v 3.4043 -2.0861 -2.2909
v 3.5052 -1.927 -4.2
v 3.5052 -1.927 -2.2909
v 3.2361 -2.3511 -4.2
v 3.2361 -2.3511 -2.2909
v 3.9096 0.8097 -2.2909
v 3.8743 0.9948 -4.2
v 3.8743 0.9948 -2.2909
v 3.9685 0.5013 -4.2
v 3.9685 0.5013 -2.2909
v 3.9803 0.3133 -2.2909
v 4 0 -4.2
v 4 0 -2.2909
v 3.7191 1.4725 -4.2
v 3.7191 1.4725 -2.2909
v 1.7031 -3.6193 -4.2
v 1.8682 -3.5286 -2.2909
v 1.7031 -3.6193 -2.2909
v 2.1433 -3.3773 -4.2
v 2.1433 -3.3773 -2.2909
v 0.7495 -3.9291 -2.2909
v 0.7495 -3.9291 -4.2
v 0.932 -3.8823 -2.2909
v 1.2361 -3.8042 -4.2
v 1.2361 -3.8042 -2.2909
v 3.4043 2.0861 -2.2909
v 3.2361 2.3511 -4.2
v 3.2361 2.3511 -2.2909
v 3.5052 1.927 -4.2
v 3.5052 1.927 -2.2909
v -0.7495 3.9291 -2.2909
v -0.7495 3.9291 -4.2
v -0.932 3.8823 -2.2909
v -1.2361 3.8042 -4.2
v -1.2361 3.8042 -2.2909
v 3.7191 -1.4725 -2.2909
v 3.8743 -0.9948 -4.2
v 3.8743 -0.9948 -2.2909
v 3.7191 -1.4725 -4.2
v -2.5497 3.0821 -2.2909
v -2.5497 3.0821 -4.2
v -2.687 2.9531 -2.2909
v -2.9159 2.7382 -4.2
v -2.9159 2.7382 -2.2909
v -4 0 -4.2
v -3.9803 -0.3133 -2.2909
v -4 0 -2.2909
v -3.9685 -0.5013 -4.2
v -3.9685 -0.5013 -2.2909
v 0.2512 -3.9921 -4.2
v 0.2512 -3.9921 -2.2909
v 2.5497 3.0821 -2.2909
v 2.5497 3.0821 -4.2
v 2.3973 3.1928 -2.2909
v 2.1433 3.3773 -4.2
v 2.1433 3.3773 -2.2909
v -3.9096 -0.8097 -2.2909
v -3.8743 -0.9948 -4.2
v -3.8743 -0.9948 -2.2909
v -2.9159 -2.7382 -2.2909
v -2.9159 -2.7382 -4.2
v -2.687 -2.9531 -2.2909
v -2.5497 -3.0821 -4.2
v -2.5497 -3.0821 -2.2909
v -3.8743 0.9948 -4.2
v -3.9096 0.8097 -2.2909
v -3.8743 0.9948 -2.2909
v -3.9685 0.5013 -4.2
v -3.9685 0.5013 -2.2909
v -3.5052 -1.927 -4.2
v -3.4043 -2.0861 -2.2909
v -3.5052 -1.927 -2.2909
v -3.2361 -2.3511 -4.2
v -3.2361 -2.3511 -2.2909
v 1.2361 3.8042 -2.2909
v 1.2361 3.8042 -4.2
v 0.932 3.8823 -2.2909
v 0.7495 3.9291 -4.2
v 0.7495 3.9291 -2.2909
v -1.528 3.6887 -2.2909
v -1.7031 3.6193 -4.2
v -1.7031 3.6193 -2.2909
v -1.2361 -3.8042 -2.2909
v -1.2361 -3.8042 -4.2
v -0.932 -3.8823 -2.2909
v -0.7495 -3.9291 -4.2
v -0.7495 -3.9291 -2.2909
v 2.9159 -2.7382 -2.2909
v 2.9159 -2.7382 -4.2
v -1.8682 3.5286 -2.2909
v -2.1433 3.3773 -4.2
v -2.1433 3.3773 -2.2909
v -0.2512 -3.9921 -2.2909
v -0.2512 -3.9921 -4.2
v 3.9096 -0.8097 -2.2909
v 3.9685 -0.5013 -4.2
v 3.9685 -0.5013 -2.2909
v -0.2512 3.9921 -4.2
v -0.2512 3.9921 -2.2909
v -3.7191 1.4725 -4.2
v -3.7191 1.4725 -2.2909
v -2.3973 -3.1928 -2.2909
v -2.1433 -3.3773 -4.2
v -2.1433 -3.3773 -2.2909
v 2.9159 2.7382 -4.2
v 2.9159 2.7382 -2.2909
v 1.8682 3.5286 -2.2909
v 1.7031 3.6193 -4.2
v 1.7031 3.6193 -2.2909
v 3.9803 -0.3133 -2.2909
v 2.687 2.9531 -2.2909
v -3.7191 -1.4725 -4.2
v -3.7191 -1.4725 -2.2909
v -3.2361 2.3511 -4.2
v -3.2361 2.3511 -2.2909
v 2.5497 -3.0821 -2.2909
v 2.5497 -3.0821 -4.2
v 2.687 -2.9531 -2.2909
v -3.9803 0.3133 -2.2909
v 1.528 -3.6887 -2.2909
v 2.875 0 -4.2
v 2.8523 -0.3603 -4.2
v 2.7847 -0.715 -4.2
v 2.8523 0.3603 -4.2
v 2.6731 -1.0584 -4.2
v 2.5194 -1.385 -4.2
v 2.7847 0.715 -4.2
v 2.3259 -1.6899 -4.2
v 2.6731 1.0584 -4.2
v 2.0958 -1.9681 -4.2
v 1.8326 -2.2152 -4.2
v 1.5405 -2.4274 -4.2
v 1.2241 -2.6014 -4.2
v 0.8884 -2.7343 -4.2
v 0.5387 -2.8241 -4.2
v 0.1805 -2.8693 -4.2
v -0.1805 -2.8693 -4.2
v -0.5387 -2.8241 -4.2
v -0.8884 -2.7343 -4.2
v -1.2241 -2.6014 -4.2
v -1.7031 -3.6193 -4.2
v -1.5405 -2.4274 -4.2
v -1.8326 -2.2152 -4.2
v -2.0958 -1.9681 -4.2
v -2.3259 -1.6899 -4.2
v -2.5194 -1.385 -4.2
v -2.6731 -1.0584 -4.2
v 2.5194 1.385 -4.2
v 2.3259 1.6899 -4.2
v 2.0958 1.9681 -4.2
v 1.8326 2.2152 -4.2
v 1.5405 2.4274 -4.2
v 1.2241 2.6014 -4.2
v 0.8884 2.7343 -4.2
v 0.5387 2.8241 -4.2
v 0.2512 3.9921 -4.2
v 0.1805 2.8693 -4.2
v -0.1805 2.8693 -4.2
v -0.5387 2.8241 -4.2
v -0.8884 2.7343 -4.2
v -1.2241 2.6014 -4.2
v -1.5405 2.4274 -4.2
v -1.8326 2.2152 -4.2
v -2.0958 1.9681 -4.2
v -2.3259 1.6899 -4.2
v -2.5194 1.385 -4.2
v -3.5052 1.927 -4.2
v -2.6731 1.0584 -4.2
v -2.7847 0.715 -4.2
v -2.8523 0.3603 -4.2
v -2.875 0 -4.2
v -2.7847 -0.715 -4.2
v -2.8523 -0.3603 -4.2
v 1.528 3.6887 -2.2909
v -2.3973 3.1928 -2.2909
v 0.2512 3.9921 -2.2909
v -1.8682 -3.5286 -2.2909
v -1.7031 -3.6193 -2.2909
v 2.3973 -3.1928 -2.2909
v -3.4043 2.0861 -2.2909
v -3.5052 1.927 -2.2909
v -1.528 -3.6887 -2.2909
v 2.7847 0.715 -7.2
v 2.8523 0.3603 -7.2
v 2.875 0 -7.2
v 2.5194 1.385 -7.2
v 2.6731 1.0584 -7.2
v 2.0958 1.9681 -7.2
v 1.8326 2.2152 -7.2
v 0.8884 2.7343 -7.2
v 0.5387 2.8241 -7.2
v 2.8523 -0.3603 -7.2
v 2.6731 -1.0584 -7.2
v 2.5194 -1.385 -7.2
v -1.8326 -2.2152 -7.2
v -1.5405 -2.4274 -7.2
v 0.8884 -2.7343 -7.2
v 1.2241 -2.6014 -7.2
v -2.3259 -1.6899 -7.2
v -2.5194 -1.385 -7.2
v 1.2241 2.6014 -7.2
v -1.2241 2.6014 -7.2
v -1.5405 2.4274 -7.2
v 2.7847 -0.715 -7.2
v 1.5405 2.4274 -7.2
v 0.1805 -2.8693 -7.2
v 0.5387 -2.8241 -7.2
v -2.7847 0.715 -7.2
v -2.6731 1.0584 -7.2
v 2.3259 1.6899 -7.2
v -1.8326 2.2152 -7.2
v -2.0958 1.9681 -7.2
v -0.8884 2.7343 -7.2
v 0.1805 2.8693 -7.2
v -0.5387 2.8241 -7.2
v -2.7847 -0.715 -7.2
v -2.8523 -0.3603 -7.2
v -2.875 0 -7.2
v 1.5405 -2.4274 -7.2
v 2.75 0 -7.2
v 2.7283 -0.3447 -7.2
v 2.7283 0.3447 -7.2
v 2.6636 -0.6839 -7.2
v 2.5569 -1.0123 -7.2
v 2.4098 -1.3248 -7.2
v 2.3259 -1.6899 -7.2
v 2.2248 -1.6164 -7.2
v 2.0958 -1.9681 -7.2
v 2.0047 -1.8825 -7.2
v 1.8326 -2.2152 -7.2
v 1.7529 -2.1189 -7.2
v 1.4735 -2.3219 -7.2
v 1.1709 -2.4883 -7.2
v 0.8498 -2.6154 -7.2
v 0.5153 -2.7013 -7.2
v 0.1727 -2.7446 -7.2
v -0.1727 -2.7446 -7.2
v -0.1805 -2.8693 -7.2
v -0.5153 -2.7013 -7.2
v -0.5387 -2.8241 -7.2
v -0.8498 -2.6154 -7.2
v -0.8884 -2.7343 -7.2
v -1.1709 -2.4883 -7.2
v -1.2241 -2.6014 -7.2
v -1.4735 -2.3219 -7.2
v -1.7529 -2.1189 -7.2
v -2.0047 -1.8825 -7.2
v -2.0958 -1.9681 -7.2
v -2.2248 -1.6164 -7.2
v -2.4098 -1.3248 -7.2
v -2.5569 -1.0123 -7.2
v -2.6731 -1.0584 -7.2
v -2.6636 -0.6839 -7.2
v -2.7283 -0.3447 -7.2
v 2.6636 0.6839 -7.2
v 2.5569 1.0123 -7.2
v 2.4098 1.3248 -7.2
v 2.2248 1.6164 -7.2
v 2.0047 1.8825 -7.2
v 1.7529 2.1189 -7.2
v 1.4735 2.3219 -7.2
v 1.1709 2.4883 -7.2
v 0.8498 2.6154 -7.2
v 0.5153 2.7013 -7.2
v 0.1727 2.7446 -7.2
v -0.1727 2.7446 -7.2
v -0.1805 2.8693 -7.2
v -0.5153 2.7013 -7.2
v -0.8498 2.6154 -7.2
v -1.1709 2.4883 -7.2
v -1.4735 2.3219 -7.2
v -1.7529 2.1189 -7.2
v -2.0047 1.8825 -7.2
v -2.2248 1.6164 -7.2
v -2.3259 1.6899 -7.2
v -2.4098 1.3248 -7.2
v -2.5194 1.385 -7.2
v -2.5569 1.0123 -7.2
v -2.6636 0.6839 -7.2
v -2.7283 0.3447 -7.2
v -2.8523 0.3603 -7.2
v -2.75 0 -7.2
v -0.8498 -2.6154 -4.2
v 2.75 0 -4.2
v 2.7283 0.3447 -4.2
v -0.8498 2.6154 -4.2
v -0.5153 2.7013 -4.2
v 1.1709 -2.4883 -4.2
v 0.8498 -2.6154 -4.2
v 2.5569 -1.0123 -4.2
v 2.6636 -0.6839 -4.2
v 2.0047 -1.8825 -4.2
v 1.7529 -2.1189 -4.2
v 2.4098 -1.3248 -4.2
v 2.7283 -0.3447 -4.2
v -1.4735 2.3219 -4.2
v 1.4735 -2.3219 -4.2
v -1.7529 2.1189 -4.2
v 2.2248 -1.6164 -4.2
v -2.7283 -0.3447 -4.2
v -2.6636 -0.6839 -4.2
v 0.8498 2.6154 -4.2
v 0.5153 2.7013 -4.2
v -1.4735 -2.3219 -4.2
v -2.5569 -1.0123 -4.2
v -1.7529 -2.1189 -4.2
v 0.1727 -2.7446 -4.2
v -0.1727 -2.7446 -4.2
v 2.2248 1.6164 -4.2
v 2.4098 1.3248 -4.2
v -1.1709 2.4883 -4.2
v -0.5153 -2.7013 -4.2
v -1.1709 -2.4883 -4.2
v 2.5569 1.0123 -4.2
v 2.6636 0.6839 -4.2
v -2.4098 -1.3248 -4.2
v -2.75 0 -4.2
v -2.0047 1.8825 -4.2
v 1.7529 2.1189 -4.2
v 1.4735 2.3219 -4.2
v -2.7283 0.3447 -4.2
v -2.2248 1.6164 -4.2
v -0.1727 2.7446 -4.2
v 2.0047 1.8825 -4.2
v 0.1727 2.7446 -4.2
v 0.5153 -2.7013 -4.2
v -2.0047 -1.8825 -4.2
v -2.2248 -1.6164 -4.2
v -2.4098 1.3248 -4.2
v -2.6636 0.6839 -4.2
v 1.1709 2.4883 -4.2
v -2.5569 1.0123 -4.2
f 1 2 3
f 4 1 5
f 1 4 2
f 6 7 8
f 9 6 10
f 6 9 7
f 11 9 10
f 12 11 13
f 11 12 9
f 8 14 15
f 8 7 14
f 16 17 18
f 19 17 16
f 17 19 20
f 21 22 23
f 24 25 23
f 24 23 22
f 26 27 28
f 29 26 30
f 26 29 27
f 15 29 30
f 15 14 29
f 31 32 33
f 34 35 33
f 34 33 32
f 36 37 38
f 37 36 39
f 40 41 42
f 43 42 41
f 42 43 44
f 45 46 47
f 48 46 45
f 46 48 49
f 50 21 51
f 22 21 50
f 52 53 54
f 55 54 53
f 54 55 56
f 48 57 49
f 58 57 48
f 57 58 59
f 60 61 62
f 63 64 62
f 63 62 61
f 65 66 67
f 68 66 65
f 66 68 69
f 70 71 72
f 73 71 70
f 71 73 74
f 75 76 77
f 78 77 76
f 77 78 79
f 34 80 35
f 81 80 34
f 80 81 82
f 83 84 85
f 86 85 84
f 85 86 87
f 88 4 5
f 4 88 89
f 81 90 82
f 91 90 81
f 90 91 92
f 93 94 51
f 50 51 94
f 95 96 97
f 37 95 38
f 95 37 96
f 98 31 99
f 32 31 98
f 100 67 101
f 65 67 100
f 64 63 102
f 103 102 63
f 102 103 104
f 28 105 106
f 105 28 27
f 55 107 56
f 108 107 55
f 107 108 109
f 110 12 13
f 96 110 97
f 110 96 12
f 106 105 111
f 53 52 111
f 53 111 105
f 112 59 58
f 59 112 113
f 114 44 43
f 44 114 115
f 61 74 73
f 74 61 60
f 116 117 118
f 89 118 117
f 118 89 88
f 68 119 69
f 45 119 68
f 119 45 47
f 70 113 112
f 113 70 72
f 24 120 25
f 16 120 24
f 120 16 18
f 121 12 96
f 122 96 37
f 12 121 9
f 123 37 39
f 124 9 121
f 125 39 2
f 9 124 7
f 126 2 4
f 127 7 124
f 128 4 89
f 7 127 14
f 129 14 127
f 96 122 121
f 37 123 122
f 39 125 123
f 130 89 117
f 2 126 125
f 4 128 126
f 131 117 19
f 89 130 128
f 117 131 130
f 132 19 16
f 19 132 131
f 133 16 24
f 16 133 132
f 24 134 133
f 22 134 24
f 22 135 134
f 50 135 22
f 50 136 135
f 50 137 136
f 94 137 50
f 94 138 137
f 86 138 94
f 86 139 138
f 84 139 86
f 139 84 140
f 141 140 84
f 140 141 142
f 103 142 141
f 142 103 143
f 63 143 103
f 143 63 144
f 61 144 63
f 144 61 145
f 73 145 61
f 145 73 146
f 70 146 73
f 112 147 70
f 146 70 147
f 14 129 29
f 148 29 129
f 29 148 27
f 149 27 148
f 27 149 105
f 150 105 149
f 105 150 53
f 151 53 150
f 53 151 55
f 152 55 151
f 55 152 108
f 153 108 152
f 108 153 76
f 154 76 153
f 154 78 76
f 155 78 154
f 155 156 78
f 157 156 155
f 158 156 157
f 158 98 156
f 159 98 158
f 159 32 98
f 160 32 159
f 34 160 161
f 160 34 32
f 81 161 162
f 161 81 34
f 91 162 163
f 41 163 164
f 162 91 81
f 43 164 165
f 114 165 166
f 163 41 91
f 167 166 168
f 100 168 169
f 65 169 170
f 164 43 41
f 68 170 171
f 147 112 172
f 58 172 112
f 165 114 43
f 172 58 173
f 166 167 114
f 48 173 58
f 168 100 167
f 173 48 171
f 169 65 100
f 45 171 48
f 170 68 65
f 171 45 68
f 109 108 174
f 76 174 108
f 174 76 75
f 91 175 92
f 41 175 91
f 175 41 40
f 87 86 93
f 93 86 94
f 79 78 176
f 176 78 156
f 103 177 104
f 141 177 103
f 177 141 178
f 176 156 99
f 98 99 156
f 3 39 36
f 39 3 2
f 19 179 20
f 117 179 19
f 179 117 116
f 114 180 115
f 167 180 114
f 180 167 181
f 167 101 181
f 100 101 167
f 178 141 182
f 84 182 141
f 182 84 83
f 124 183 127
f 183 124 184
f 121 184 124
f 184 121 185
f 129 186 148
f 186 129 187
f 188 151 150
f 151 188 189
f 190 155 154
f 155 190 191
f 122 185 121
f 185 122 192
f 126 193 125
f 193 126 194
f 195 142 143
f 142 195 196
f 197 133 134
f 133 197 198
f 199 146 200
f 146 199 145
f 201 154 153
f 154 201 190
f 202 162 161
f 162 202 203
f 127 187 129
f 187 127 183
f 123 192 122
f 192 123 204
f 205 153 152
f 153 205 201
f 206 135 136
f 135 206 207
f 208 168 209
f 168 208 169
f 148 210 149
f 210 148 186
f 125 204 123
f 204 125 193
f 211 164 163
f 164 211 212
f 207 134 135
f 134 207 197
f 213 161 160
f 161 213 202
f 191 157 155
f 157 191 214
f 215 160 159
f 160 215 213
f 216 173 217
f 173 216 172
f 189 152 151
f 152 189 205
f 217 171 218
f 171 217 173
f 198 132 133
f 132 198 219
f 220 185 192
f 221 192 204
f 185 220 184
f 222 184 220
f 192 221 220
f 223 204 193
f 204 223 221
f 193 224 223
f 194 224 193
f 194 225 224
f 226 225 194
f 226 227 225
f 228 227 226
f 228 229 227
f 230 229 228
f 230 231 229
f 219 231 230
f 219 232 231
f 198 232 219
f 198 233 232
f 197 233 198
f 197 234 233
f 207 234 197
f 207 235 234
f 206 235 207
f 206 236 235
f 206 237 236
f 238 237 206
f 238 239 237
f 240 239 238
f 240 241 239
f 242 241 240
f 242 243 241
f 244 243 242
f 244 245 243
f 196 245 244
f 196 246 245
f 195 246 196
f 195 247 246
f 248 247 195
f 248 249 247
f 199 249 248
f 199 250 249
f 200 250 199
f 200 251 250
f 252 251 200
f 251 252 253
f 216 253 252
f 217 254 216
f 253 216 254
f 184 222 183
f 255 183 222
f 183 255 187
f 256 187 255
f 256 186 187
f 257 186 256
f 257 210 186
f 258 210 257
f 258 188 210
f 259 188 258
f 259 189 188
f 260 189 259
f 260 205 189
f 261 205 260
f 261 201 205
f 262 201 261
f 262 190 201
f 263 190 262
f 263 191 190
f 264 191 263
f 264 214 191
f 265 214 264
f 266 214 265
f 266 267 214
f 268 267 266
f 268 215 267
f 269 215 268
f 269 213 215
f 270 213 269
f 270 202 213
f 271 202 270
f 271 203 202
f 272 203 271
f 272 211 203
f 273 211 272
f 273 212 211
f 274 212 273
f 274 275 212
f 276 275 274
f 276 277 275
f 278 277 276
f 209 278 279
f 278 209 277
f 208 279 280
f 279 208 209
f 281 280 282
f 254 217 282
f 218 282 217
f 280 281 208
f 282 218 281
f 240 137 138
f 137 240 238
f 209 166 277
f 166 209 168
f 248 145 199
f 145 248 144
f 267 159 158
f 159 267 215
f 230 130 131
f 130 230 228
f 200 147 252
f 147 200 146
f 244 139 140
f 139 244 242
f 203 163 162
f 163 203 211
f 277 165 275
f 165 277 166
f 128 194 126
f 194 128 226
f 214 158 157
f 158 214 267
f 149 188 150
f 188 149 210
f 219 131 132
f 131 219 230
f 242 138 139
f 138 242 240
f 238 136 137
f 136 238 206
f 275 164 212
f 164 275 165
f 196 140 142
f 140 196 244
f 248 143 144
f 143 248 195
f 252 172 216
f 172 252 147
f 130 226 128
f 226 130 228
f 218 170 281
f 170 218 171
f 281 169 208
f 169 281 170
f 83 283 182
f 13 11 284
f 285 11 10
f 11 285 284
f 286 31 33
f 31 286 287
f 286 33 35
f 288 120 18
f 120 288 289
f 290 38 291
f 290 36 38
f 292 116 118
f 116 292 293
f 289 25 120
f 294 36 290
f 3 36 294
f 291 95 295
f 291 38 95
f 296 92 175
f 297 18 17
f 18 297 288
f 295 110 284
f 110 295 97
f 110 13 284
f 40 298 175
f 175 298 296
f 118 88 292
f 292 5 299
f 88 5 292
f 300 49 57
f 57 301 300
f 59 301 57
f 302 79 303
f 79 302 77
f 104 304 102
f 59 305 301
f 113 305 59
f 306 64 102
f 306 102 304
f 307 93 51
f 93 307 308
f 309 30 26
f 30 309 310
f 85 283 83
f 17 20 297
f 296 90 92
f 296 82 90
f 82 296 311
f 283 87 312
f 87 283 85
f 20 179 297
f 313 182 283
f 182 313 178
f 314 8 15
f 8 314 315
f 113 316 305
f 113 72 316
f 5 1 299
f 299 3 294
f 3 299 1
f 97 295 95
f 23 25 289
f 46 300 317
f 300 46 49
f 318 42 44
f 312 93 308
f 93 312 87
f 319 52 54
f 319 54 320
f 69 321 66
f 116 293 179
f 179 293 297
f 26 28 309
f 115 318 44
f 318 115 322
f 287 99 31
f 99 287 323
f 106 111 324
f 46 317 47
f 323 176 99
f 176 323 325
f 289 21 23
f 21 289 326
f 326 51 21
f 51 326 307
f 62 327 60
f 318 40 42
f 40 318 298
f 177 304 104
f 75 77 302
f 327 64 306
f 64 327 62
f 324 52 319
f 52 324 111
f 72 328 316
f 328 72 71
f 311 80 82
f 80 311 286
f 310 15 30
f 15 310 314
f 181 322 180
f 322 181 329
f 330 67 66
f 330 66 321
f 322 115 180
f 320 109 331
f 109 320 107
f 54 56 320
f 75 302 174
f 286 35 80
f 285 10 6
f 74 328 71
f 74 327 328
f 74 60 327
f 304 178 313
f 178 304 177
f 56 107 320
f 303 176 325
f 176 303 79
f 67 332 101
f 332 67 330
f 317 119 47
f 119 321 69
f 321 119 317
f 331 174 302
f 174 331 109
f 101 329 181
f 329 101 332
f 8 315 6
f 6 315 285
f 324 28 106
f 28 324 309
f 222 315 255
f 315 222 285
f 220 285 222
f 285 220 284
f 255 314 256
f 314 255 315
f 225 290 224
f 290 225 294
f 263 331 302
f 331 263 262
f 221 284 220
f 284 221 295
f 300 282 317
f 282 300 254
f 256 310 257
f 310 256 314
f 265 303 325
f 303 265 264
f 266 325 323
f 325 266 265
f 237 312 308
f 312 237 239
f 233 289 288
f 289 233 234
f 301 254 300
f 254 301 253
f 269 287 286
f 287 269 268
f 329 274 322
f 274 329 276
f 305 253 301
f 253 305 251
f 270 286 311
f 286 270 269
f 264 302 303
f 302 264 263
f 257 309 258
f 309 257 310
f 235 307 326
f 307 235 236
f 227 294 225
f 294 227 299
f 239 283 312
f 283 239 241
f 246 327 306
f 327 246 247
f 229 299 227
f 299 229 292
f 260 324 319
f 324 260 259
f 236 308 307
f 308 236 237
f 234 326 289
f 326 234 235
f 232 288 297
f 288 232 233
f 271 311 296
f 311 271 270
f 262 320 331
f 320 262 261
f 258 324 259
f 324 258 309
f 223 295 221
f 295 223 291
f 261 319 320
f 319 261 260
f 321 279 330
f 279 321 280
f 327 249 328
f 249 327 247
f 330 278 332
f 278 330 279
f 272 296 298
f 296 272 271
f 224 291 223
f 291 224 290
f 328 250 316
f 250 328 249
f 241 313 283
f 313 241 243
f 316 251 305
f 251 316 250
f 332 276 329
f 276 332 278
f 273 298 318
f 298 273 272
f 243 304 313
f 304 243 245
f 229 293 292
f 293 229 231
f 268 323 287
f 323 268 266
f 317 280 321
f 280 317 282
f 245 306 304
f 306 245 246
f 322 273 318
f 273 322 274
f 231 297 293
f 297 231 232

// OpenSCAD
$fn = 50;

difference() {
	union() {
		translate(v = [0, 0, -4.2]) {
			cylinder(h = 7.2, r = 4.0);
		}
		#translate(v = [0, 0, -7.2]) {
			cylinder(h = 7.2, r = 2.875);
		}
	}
	union() {
		translate(v = [0, 0, 0]) {
			rotate(a = [0, 0, 0]) {
				difference() {
					union() {
						translate(v = [0, 0, -7.2]) {
							cylinder(h = 7.2, r = 2.25);
						}
						translate(v = [0, 0, -4.2]) {
							cylinder(h = 4.2, r1 = 2.75, r2 = 5.5);
						}
						translate(v = [0, 0, -7.2]) {
							cylinder(h = 7.2, r = 2.75);
						}
						translate(v = [0, 0, -7.2]) {
							cylinder(h = 7.2, r = 2.25);
						}
					}
					union();
				}
			}
		}
		#cylinder(h = 3, r = 6.25);
	}
}
